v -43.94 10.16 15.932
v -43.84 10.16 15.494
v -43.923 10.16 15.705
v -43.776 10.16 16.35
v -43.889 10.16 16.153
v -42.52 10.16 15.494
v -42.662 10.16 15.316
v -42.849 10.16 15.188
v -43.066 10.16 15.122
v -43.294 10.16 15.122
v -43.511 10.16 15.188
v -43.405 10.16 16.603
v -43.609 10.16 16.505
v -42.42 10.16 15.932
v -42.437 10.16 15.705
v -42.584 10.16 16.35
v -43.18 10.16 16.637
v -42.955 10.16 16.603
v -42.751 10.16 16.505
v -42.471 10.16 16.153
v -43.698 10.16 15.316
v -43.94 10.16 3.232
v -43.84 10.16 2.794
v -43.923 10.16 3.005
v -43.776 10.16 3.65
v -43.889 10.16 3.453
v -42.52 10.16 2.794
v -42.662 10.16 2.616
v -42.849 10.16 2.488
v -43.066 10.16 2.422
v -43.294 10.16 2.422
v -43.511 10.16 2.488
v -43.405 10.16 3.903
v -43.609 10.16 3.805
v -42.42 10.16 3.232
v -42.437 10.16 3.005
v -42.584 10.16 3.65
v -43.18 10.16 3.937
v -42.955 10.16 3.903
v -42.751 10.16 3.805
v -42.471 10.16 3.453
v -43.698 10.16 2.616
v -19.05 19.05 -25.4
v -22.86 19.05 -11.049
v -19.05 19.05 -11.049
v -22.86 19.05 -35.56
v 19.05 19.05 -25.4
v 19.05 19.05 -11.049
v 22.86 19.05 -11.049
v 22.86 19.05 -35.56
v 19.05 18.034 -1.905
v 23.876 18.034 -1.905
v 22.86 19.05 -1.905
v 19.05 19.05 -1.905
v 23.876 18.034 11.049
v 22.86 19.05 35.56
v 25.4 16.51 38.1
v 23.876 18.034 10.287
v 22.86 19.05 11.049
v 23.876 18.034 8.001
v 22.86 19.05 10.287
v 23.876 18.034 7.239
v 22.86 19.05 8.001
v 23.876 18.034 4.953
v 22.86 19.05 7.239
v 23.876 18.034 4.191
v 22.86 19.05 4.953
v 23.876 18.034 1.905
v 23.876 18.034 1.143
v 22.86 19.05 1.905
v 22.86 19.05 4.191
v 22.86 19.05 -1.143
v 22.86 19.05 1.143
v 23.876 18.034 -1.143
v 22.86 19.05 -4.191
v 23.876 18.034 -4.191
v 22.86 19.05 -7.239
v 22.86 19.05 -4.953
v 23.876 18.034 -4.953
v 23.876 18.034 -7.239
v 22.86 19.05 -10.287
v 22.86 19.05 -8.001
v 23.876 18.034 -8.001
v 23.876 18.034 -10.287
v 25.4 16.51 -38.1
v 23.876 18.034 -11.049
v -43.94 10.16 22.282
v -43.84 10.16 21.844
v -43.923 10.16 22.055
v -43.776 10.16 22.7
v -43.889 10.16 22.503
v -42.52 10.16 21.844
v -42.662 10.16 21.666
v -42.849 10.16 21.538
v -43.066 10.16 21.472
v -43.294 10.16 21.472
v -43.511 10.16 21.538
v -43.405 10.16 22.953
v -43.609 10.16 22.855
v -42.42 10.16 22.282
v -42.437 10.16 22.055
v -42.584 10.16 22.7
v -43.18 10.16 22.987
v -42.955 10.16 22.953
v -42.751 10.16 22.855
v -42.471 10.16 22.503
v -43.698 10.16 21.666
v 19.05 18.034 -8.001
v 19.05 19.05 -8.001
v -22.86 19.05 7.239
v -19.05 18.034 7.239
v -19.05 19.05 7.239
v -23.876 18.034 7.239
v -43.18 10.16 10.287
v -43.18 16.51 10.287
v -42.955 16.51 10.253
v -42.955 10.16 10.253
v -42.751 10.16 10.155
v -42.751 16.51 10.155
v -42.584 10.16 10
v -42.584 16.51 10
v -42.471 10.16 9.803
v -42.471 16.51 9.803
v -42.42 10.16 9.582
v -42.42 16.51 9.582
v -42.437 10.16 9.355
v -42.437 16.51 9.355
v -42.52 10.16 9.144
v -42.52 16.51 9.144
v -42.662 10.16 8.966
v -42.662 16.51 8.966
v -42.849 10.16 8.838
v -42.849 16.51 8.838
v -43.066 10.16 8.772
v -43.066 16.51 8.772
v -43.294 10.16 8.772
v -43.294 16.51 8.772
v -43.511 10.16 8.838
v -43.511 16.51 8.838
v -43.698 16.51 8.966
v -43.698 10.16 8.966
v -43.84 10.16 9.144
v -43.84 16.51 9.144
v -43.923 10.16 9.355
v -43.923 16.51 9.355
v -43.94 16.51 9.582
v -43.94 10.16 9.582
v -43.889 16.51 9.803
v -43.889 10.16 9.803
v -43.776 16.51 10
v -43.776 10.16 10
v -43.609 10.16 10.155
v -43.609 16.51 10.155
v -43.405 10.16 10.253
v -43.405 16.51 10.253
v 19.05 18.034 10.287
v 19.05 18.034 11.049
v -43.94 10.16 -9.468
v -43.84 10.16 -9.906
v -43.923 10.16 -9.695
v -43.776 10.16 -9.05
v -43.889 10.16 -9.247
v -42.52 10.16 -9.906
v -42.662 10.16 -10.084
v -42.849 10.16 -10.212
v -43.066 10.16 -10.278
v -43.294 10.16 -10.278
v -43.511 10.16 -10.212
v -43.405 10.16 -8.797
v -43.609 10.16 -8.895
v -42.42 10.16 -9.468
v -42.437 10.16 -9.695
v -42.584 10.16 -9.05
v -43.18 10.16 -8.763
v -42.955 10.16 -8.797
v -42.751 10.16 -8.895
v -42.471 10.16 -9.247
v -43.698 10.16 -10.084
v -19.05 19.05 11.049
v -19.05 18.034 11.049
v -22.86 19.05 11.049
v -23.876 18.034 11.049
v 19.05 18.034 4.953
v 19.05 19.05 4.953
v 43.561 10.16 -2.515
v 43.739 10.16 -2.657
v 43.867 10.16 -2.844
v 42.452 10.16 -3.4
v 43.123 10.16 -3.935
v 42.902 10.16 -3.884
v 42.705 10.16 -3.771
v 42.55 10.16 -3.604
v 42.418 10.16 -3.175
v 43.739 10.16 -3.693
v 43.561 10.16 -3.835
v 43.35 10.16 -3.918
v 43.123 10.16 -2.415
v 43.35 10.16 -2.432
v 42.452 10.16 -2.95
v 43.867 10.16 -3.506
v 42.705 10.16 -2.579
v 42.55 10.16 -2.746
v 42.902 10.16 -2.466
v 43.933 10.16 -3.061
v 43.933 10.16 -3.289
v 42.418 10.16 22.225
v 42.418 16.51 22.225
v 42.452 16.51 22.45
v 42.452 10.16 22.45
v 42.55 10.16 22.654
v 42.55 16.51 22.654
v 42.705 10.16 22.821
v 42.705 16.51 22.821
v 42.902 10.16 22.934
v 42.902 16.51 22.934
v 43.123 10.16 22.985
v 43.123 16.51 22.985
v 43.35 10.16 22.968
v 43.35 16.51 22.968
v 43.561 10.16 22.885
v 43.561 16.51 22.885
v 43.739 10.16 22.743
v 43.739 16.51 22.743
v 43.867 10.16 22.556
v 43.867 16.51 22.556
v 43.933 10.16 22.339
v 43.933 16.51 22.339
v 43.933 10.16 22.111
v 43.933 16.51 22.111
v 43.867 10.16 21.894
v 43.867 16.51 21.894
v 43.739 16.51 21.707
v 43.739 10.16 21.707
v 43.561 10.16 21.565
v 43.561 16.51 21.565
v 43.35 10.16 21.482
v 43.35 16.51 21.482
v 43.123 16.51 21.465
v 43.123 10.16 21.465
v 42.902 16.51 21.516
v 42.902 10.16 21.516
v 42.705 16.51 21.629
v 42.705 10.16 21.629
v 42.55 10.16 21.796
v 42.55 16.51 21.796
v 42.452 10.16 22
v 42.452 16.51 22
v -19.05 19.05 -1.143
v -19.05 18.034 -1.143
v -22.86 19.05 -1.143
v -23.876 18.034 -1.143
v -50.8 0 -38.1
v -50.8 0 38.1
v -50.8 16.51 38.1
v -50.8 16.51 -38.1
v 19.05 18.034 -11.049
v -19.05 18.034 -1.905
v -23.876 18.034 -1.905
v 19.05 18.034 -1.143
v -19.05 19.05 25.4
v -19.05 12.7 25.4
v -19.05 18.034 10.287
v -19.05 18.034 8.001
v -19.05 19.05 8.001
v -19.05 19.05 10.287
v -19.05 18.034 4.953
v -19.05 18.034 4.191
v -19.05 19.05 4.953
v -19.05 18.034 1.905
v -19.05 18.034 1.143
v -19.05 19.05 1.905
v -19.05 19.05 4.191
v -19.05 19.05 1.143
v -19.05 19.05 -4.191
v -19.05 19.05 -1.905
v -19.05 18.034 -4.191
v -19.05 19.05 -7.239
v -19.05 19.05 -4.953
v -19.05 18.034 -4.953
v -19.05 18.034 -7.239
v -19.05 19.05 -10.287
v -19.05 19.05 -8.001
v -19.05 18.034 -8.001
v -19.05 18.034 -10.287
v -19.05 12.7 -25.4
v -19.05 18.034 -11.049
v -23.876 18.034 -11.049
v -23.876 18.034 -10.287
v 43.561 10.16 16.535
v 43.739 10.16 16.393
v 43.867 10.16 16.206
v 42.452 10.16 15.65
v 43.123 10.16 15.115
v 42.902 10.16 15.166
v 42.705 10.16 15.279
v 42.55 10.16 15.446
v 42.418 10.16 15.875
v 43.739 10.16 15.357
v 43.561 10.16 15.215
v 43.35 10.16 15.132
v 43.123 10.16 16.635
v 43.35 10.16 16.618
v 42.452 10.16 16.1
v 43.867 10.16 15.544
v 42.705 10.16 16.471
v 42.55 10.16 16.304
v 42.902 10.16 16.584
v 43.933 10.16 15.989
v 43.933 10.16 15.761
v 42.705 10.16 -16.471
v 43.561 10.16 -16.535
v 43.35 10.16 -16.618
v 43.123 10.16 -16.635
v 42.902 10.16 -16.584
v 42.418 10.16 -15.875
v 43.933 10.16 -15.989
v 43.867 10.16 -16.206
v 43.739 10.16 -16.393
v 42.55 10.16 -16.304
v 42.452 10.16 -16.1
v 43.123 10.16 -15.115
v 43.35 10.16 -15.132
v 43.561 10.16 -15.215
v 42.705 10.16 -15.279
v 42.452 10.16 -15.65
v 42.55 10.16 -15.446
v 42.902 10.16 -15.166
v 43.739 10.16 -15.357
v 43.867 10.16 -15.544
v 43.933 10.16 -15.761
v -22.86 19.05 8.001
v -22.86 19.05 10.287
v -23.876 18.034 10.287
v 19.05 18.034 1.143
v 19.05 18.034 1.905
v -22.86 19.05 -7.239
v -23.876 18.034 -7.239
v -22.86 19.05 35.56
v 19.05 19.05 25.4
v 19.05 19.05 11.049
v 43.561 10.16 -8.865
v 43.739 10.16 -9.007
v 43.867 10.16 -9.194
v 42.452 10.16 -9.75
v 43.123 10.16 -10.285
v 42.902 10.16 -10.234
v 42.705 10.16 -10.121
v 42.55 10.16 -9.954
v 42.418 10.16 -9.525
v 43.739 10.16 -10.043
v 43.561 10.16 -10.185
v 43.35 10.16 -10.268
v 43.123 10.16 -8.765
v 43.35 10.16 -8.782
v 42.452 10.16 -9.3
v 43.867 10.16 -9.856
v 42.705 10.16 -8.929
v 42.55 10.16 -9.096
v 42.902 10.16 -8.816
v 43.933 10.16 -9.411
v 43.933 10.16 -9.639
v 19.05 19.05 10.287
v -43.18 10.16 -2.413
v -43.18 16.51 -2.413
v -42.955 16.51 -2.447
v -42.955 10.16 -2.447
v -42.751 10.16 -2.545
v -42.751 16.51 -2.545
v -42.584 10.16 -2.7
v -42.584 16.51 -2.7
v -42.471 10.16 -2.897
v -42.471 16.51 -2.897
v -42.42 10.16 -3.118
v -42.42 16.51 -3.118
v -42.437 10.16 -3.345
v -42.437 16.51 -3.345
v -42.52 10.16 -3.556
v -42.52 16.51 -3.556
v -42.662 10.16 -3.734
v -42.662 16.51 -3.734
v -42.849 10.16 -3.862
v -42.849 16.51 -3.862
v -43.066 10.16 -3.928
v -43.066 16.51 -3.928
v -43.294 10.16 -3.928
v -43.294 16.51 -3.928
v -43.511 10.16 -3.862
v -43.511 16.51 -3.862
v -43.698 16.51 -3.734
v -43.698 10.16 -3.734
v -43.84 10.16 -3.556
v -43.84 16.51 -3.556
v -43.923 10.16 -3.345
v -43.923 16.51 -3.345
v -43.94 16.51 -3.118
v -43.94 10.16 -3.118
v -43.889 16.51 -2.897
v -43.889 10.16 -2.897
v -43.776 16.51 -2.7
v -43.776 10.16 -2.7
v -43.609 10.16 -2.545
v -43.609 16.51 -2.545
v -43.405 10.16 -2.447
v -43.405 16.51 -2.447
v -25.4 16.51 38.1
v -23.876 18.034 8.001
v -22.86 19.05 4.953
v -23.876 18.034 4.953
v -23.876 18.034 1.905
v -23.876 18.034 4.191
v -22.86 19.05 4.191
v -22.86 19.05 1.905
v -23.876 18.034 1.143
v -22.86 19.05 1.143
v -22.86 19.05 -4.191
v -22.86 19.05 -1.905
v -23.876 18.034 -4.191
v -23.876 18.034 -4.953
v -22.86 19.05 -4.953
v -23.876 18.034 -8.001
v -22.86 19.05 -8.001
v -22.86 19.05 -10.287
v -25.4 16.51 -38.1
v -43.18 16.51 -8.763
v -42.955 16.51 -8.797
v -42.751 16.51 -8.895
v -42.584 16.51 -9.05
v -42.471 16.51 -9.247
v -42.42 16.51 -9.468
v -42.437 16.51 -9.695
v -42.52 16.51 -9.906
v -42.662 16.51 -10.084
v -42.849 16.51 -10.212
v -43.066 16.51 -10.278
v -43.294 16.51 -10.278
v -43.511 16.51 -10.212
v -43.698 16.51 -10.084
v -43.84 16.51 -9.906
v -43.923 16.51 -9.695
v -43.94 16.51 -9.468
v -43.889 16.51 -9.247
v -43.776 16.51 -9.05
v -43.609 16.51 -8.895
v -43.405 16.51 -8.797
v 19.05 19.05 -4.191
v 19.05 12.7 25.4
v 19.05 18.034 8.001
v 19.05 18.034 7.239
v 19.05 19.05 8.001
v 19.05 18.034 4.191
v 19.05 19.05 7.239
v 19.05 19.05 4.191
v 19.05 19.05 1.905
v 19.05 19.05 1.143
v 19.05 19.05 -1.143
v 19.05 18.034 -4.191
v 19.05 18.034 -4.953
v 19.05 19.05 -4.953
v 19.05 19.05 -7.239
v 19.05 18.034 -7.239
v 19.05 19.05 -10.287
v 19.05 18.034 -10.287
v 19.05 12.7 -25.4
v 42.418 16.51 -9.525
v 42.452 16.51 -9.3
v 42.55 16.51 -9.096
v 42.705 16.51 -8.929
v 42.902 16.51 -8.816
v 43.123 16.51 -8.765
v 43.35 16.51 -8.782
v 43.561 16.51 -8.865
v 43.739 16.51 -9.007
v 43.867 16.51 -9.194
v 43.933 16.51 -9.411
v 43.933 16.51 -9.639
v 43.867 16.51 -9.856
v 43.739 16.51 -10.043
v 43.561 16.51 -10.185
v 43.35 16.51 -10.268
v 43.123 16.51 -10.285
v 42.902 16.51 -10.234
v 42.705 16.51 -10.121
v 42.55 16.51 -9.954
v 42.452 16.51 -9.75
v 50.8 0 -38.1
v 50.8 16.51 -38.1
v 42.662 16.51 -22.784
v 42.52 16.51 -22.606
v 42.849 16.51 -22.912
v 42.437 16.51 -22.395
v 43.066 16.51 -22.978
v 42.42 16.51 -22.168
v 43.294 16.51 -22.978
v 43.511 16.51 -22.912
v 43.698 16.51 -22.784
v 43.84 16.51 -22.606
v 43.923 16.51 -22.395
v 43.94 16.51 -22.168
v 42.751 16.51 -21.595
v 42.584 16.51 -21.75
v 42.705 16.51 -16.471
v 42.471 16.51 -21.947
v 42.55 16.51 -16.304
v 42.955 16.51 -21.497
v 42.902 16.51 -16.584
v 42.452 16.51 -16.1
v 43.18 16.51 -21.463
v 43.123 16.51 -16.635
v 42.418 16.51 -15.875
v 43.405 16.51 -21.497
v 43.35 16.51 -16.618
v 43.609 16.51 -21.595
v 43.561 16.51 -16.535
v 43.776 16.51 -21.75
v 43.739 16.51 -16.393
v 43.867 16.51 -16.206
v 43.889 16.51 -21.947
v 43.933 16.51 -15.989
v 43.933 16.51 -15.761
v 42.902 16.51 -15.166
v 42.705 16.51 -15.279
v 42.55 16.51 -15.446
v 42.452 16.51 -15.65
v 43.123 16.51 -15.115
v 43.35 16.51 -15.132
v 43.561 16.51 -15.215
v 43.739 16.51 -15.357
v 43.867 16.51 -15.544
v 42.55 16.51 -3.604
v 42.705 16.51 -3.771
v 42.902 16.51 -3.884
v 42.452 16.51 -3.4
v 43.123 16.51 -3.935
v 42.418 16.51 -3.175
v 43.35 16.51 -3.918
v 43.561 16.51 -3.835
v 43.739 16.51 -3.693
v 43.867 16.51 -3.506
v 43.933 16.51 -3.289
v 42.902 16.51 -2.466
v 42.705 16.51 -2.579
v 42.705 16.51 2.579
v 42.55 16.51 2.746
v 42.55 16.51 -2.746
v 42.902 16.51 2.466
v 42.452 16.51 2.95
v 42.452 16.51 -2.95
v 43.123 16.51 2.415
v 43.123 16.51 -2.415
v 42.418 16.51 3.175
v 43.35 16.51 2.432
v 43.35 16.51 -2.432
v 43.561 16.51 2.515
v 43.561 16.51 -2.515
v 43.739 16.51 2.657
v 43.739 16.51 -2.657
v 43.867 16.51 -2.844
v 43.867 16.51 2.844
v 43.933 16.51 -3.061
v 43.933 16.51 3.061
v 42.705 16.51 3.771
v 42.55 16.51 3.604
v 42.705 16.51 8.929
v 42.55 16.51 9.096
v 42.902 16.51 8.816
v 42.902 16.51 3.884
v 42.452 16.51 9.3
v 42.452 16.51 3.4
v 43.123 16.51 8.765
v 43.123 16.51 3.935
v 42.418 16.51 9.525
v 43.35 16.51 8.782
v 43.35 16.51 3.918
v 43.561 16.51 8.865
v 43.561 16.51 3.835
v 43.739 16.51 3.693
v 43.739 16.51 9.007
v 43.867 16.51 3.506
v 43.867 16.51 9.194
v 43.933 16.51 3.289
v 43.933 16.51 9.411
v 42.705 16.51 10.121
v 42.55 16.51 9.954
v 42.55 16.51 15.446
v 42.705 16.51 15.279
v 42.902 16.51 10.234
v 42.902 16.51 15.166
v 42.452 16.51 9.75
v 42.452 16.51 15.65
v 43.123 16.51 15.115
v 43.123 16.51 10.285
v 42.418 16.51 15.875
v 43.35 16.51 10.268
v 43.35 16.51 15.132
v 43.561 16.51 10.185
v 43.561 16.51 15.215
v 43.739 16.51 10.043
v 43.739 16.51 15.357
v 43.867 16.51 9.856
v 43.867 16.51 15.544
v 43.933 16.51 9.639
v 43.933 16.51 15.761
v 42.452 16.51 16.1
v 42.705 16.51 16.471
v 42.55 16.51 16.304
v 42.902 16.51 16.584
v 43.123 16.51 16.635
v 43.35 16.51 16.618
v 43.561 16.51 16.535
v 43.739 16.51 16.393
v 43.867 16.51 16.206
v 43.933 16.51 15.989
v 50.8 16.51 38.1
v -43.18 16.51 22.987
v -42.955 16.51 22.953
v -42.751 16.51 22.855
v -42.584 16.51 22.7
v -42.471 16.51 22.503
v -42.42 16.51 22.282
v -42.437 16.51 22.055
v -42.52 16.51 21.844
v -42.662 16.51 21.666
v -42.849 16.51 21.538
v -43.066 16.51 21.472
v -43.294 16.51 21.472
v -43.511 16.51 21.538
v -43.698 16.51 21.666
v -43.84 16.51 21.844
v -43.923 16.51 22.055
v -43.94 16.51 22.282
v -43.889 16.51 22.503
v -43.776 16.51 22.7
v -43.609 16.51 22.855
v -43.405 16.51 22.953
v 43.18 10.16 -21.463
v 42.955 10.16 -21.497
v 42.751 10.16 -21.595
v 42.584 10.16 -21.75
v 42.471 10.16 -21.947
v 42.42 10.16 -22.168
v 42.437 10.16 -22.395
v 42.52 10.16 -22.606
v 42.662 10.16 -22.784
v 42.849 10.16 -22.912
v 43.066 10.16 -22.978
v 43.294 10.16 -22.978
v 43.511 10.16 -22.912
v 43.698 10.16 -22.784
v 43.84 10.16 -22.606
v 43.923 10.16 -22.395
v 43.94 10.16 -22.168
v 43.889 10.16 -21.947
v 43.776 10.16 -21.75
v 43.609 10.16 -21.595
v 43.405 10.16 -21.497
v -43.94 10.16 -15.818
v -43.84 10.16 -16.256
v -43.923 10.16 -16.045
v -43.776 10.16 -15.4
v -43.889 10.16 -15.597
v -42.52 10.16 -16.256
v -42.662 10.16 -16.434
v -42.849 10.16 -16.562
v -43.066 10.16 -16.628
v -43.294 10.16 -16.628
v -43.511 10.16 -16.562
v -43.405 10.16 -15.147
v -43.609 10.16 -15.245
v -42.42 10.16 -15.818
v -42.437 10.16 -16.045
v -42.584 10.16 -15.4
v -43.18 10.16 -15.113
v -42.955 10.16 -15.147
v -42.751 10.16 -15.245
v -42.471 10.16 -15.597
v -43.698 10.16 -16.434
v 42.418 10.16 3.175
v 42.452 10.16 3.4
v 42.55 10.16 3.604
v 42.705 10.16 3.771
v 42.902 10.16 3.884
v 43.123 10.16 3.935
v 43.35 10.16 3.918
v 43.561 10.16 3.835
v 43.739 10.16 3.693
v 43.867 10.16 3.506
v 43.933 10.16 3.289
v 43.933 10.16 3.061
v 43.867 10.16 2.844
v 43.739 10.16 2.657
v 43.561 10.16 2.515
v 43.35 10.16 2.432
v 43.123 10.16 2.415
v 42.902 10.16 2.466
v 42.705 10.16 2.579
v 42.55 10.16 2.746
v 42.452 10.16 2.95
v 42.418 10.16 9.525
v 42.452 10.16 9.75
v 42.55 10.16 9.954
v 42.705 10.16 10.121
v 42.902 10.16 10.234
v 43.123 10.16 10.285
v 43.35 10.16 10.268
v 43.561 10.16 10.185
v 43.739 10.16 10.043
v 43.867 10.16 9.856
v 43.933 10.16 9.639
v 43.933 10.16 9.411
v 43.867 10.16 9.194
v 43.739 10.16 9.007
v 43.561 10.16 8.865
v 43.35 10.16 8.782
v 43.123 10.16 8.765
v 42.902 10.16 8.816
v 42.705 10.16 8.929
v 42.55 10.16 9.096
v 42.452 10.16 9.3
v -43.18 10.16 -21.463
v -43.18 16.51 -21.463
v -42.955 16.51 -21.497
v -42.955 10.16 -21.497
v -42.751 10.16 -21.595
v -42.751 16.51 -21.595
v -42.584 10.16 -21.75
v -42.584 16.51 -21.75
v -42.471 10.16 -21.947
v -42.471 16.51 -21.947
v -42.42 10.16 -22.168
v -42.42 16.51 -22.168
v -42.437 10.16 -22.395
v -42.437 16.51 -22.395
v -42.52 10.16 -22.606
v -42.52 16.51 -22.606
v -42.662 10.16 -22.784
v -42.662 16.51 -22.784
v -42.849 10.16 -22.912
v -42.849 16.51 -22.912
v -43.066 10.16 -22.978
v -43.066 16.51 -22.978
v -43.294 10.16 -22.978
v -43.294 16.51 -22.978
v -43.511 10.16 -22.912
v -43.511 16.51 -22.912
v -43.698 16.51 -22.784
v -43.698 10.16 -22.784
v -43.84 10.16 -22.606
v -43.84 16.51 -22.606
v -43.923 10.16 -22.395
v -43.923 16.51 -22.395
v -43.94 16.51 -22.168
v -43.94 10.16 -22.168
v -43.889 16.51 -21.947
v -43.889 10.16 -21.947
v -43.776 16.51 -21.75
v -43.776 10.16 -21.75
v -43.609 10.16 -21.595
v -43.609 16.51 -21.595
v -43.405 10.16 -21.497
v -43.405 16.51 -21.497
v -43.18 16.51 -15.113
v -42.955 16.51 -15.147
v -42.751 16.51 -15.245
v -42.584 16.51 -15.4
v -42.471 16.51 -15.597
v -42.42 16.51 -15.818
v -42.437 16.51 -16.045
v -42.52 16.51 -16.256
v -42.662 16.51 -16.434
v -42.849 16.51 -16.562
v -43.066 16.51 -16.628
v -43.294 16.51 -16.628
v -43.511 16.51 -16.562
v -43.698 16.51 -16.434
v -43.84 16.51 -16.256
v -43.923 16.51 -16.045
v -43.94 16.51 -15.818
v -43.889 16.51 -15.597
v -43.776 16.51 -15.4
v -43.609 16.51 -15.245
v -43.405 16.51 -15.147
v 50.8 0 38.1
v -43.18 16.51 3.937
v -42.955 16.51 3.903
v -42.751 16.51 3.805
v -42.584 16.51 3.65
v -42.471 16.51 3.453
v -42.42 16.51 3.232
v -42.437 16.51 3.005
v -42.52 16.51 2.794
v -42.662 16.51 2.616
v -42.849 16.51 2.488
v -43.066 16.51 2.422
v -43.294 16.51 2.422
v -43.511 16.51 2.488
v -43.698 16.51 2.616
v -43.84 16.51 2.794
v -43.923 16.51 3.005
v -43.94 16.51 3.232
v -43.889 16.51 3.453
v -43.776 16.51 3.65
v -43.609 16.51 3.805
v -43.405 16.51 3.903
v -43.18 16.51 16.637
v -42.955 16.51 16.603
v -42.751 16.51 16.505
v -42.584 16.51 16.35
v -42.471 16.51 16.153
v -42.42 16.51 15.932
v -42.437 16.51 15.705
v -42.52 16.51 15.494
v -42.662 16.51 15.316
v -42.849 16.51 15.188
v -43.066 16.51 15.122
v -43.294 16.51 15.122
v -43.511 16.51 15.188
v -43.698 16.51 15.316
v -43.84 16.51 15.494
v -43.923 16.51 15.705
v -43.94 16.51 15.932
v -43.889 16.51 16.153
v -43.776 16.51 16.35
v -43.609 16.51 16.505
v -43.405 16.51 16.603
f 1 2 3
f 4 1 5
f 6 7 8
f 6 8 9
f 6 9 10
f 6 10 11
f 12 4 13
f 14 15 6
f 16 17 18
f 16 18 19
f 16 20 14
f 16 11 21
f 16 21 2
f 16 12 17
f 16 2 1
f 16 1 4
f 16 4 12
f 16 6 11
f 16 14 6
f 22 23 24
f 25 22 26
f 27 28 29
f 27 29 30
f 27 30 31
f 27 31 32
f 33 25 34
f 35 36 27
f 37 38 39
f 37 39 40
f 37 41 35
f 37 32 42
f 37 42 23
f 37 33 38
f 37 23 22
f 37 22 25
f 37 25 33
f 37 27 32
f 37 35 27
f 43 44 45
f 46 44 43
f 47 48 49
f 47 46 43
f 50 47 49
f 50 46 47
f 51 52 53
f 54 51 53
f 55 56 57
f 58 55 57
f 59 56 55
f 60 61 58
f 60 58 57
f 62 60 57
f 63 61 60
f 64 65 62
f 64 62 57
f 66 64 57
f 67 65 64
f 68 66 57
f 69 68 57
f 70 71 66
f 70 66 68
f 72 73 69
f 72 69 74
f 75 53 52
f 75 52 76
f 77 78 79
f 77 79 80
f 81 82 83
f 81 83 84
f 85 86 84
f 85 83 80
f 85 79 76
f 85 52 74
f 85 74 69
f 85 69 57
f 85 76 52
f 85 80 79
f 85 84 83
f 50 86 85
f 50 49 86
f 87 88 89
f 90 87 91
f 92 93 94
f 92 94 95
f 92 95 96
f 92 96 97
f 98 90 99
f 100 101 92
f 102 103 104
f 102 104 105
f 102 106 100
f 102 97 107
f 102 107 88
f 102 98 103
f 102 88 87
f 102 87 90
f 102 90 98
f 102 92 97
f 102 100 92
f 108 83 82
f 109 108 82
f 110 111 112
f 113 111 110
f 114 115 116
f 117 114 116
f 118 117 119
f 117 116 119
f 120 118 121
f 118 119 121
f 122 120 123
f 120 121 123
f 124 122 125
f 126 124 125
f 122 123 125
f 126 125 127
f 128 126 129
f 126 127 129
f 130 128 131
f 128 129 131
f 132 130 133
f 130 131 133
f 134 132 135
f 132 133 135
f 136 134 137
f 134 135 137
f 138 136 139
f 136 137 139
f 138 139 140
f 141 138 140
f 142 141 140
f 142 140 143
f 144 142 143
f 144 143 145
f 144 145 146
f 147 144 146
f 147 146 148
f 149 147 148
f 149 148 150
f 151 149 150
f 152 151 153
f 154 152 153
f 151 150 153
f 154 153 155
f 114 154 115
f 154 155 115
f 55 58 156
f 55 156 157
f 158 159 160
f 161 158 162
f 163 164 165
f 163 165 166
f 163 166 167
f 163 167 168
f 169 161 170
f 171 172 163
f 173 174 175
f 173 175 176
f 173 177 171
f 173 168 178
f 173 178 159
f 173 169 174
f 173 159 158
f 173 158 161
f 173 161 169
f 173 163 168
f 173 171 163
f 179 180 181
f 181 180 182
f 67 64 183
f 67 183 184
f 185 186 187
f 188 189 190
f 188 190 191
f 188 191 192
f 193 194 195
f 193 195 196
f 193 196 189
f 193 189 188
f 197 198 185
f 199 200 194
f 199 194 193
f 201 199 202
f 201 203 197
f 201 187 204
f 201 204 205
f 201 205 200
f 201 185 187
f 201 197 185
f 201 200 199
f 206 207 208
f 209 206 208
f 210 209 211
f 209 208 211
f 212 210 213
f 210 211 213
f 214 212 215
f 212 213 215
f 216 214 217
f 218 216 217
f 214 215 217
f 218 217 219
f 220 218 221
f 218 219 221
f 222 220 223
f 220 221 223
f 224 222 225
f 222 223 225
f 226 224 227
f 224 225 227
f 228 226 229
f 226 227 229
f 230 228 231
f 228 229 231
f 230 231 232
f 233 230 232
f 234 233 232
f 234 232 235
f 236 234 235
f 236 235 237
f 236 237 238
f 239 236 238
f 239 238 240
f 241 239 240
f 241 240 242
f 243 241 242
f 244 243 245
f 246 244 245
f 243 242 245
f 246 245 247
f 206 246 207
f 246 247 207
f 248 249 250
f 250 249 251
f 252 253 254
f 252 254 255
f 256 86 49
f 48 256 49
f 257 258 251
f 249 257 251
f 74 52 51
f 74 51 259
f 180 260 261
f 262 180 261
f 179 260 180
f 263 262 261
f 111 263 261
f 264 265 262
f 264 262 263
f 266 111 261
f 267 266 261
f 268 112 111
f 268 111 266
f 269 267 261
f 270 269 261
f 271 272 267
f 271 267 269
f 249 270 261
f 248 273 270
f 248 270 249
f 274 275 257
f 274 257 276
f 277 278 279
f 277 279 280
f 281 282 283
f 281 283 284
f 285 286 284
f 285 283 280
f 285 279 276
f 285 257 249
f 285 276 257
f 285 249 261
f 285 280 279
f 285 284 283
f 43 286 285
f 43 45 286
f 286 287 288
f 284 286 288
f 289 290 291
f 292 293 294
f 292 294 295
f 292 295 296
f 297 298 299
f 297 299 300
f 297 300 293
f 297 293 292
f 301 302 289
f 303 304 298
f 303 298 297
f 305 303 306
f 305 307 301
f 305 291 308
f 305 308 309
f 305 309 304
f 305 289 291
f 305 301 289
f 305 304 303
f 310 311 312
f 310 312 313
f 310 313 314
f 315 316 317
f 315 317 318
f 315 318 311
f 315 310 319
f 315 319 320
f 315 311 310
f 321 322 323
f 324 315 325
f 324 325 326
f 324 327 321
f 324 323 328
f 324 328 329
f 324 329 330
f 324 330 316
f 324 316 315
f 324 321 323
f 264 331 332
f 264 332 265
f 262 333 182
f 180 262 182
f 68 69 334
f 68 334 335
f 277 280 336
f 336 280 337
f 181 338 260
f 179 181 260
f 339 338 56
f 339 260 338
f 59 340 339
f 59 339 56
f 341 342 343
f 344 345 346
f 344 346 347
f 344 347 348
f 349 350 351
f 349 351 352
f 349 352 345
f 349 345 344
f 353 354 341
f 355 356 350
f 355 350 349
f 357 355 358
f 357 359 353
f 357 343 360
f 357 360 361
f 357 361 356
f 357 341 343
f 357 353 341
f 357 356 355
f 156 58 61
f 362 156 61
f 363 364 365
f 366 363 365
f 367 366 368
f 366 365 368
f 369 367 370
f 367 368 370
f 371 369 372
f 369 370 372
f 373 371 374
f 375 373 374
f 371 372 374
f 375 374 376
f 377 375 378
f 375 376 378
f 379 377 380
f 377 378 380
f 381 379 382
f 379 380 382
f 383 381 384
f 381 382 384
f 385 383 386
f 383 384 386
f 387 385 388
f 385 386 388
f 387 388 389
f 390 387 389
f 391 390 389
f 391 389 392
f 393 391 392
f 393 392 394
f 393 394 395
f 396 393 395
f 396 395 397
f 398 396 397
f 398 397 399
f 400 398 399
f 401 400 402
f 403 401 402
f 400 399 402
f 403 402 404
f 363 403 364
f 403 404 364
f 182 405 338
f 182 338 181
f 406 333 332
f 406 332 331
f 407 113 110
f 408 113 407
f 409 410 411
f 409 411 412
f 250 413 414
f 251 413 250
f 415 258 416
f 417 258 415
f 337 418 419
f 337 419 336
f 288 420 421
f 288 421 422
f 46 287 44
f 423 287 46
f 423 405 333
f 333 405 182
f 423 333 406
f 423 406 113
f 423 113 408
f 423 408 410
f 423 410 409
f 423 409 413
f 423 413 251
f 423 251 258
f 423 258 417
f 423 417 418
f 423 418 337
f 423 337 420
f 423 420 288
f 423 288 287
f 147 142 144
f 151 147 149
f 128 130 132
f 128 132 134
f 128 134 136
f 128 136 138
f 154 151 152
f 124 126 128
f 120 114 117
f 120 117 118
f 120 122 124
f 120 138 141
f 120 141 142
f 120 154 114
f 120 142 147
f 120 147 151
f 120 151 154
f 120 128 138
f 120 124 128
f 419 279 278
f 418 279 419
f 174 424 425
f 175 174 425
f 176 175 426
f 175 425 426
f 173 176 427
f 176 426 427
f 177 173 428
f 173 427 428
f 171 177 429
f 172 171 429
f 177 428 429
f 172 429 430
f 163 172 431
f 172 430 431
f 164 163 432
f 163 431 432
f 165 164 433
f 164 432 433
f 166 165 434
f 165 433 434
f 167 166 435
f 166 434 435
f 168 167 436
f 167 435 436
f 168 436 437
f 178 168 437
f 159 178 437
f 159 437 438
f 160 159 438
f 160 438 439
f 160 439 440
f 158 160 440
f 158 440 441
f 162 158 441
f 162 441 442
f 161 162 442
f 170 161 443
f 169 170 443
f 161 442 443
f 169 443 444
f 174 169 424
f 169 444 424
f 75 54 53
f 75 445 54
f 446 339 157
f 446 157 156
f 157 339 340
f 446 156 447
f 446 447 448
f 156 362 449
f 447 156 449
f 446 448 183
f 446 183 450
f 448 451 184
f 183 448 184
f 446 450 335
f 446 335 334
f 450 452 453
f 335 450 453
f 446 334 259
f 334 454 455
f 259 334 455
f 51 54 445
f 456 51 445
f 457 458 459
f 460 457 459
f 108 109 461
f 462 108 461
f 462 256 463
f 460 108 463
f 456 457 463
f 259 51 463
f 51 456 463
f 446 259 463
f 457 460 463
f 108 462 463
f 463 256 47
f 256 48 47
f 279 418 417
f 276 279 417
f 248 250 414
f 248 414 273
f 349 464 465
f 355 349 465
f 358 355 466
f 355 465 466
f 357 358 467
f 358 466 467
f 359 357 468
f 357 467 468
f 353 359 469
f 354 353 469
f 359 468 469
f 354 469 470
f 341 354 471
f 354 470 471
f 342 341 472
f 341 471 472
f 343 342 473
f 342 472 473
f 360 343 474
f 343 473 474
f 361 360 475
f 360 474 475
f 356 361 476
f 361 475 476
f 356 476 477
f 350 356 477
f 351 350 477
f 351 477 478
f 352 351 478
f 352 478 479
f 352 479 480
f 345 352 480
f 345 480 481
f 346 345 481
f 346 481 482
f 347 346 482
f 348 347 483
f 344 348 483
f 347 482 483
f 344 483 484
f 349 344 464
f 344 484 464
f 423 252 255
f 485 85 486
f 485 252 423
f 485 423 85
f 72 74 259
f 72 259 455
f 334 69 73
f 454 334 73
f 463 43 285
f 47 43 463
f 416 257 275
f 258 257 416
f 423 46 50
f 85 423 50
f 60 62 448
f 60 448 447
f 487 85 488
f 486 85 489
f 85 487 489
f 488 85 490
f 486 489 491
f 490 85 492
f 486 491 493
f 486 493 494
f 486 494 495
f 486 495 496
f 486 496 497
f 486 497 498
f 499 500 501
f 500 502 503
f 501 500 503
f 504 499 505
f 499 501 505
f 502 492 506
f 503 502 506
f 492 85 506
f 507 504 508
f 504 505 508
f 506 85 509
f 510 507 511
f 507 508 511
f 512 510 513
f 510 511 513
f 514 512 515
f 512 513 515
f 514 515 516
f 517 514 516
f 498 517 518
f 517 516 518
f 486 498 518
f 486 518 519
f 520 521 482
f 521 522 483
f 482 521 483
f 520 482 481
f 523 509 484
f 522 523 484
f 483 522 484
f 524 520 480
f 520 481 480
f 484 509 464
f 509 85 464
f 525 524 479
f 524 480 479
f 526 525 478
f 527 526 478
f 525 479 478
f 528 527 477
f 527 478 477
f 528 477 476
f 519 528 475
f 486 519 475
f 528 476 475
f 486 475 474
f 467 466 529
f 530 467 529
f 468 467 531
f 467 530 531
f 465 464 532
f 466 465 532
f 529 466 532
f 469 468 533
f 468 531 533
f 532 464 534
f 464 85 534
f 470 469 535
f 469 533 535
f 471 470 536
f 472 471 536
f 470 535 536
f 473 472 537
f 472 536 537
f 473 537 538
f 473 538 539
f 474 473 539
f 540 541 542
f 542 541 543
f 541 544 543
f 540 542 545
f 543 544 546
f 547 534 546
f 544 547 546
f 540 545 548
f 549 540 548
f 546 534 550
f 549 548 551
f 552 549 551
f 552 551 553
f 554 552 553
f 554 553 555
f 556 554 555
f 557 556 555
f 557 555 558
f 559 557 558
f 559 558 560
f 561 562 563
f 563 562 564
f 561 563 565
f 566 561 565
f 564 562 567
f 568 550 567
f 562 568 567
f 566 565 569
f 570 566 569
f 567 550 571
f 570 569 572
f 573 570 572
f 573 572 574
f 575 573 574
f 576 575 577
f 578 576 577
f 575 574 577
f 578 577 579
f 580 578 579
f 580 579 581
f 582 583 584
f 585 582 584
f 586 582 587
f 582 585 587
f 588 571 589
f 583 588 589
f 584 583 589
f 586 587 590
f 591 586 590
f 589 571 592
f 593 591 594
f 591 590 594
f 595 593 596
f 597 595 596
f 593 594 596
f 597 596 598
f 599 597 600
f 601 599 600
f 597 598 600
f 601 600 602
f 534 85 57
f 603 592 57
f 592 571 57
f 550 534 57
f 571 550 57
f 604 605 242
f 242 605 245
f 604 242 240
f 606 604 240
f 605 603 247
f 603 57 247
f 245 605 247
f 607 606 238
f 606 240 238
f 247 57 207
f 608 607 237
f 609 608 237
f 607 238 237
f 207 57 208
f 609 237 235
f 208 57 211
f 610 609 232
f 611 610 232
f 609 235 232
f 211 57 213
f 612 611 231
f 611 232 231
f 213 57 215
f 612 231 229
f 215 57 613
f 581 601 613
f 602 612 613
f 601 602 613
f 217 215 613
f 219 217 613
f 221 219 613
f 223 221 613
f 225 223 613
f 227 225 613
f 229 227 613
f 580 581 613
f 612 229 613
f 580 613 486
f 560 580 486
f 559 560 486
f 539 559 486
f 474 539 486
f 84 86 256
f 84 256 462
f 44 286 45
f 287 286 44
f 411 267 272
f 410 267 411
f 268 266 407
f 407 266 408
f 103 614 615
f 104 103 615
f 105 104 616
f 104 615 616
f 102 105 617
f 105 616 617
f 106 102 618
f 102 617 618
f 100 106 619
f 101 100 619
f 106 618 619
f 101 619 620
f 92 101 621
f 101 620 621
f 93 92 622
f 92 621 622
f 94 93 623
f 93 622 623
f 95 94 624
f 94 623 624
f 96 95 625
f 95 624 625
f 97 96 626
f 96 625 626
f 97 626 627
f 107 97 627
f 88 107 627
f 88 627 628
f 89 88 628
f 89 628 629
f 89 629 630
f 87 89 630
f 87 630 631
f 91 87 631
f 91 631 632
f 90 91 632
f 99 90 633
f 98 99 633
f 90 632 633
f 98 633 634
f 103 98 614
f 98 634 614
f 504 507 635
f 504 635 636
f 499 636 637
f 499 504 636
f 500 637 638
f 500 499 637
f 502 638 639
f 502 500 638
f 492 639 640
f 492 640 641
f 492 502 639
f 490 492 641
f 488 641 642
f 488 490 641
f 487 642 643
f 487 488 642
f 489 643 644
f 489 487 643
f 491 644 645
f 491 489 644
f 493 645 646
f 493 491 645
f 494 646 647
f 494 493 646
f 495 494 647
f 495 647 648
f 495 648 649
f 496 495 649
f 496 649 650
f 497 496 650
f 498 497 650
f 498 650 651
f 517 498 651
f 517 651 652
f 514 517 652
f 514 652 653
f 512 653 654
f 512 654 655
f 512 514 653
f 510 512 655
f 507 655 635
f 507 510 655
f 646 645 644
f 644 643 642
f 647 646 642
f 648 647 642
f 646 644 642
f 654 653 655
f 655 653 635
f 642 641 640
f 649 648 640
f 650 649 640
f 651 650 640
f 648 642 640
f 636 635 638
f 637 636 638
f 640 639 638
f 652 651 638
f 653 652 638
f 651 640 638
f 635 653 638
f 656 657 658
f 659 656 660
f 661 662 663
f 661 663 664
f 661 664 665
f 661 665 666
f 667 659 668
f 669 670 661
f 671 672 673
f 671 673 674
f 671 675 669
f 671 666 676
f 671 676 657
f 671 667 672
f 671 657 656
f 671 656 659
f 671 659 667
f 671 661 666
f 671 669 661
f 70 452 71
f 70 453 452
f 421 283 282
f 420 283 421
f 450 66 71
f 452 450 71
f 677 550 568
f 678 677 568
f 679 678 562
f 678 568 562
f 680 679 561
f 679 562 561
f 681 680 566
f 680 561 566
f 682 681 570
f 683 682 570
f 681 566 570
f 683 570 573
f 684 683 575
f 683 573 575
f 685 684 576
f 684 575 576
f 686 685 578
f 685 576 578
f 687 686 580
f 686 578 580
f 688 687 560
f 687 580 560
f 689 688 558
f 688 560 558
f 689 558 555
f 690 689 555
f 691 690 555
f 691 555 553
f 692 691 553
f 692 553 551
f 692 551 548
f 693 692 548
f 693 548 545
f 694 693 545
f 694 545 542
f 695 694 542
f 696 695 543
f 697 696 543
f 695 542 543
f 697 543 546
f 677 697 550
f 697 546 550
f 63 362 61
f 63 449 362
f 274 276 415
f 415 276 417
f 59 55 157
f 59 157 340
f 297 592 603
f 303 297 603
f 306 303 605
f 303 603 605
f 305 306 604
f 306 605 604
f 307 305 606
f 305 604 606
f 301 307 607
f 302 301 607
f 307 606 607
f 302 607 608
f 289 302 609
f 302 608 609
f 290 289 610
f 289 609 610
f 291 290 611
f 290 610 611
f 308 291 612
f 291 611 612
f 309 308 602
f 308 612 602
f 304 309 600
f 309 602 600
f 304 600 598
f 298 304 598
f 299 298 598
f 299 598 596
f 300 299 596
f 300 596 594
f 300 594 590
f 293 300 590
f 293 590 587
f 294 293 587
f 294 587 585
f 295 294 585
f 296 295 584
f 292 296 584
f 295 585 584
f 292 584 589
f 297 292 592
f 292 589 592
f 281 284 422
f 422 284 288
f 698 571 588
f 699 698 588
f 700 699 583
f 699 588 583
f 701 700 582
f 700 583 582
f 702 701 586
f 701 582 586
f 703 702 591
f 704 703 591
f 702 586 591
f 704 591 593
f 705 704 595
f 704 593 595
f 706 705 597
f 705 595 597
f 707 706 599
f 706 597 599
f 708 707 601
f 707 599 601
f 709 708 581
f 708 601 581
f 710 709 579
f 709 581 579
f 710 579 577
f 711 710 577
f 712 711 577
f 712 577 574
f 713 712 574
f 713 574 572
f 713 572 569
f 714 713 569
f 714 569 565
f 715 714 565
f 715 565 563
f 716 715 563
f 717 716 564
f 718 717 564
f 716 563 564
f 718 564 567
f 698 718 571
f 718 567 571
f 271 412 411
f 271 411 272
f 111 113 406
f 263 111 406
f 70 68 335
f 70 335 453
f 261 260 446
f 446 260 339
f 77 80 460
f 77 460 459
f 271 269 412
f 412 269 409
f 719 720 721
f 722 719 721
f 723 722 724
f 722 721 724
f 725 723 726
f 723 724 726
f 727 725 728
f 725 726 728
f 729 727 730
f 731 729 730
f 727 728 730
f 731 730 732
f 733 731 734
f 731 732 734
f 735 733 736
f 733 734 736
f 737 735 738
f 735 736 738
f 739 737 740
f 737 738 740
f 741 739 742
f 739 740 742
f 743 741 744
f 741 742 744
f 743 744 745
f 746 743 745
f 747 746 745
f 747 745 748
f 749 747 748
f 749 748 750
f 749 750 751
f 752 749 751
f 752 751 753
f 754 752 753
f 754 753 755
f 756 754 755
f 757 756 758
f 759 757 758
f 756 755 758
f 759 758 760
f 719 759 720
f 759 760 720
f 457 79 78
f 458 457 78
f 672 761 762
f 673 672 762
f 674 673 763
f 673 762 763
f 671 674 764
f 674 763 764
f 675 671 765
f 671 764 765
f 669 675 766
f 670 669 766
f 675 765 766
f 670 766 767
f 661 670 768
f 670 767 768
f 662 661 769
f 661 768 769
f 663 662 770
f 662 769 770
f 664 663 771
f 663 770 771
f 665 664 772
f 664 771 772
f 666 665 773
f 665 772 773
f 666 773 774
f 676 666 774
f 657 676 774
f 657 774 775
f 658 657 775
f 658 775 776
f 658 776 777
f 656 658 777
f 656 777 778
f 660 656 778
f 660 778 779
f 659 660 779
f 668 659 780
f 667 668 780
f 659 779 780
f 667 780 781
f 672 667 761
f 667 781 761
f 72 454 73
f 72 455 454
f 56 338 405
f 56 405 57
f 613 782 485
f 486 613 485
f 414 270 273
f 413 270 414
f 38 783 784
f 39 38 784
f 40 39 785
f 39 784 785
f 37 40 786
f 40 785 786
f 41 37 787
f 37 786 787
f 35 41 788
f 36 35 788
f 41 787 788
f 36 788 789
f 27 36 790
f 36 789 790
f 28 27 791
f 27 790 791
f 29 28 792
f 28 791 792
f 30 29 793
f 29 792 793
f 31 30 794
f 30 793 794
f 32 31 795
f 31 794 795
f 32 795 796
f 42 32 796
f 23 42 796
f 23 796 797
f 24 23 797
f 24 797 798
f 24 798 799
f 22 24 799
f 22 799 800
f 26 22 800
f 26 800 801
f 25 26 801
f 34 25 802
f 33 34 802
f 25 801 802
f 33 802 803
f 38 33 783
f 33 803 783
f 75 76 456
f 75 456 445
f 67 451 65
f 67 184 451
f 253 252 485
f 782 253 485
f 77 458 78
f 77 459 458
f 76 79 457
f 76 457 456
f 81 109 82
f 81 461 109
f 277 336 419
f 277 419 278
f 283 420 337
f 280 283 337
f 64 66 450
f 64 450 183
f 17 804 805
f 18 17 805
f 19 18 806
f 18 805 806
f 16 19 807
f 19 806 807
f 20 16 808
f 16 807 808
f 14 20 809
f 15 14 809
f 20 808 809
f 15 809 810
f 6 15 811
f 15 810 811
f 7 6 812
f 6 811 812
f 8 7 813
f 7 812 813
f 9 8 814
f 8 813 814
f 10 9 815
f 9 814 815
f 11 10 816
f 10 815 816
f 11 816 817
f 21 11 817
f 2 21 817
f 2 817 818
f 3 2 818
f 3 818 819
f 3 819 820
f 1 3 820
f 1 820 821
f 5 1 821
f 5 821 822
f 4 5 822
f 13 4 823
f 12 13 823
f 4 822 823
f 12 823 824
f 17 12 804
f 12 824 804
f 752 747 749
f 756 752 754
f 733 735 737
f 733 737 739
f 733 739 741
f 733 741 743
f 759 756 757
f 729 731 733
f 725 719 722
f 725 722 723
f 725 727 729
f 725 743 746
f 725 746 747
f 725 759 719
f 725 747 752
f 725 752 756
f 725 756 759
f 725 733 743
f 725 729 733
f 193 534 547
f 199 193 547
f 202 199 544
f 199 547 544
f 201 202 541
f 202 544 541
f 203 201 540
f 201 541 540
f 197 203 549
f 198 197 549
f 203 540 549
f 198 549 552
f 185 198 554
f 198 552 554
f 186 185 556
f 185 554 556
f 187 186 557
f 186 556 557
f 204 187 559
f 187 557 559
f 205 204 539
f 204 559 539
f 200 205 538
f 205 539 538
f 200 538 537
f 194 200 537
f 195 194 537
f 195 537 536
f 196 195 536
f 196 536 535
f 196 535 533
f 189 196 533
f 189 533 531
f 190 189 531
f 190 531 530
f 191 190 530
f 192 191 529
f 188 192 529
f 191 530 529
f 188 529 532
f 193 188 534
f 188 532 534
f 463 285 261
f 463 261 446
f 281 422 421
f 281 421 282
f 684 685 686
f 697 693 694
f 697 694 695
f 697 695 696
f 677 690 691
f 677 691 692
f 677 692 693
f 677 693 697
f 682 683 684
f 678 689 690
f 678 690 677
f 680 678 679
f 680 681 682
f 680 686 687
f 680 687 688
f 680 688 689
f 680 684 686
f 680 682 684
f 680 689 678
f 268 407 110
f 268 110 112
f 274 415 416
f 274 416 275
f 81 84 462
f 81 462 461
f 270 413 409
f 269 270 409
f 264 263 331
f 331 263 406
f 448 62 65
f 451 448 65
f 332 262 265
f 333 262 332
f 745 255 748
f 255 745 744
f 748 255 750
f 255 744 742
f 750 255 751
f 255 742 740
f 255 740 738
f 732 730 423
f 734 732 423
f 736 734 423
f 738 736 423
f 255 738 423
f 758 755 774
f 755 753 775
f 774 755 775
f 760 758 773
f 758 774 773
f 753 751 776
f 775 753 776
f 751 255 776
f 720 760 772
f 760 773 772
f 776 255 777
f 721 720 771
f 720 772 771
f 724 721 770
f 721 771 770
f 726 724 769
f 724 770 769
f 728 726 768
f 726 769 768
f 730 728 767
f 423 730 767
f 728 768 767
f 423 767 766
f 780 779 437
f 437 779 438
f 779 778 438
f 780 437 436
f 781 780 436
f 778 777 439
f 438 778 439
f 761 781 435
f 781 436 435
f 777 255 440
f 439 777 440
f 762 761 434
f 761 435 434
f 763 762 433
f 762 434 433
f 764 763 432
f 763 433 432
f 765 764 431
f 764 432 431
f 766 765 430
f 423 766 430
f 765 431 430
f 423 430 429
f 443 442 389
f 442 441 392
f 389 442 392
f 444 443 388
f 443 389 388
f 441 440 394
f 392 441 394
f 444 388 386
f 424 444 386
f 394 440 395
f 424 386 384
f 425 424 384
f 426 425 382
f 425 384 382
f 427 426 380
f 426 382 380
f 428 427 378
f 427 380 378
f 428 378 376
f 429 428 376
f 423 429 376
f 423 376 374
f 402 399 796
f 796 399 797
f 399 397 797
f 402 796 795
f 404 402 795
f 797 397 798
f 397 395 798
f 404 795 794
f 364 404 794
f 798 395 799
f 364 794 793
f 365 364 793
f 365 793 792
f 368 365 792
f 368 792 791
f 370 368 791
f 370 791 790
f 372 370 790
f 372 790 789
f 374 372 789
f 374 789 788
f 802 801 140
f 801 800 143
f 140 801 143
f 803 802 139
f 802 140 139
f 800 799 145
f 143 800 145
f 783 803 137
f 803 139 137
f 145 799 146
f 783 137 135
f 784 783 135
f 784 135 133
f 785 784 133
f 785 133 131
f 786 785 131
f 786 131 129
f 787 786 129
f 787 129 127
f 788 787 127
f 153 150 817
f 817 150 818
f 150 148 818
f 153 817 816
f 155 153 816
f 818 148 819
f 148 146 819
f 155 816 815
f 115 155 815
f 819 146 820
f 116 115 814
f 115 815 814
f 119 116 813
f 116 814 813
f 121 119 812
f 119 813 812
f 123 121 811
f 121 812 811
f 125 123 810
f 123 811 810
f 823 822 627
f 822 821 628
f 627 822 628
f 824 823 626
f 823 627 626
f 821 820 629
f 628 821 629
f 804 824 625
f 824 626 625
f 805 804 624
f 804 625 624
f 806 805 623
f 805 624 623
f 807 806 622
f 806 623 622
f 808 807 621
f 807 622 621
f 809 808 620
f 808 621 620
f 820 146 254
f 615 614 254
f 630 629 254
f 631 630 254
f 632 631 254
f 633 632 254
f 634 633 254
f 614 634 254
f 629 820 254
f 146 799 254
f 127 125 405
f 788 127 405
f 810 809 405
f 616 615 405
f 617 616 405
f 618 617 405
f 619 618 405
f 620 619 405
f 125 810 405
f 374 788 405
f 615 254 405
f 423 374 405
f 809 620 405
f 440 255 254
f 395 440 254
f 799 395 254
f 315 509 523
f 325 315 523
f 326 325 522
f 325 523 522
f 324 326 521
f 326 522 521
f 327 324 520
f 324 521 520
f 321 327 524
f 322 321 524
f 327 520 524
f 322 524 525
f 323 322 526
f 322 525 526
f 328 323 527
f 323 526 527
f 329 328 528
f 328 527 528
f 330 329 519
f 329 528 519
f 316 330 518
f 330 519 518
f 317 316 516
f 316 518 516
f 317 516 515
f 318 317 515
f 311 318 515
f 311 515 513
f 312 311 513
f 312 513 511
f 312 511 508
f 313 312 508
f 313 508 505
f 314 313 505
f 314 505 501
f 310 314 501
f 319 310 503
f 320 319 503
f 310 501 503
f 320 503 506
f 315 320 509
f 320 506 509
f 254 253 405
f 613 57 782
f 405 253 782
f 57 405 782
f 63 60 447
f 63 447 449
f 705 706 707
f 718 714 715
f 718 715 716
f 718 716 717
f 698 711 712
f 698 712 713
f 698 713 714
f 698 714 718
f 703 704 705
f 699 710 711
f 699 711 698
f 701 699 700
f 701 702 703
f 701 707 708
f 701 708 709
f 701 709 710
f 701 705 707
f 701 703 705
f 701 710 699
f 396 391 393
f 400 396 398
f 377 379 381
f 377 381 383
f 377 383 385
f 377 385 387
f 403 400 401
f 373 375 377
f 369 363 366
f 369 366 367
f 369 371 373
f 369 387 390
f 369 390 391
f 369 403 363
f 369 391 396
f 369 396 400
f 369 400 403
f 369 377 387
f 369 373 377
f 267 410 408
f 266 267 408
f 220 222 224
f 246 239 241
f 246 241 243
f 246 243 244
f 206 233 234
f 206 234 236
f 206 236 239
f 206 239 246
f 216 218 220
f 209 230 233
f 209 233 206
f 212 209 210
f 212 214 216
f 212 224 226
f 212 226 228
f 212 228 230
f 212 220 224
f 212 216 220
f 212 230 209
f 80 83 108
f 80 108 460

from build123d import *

# Parameters (mm, degrees)
SKETCH1_W               = 101.6
SKETCH1_H               = 76.2
BOSS_EXTRUDE1_DEPTH     = 19.05
SKETCH2_W               = 38.1
SKETCH2_H               = 50.8
CUT_EXTRUDE1_DEPTH      = 6.35
SKETCH3_W               = 25.4
SKETCH3_H               = 2.54
CUT_EXTRUDE2_DEPTH      = 94.541341128
CHAMFER1_SIZE           = 2.54
SKETCH4_R               = 0.762
CUT_EXTRUDE3_DEPTH      = 6.35
LPATTERN1_COUNT         = 8
LPATTERN1_PITCH         = 6.35
MIRROR1_COPY_1_SKETCH_R = 0.762
MIRROR1_COPY_1_DEPTH    = 6.35
MIRROR1_COPY_2_SKETCH_R = 0.762
MIRROR1_COPY_2_DEPTH    = 6.35
MIRROR1_COPY_3_SKETCH_R = 0.762
MIRROR1_COPY_3_DEPTH    = 6.35
MIRROR1_COPY_4_SKETCH_R = 0.762
MIRROR1_COPY_4_DEPTH    = 6.35
MIRROR1_COPY_5_SKETCH_R = 0.762
MIRROR1_COPY_5_DEPTH    = 6.35
MIRROR1_COPY_6_SKETCH_R = 0.762
MIRROR1_COPY_6_DEPTH    = 6.35
MIRROR1_COPY_7_SKETCH_R = 0.762
MIRROR1_COPY_7_DEPTH    = 6.35
SKETCH6_W               = 0.762
SKETCH6_H               = 1.016
CUT_EXTRUDE8_DEPTH      = 111.168382488
LPATTERN2_COUNT         = 8
LPATTERN2_PITCH         = 3.048


with BuildPart() as part:
    # Sketch1 → Boss-Extrude1 (new body)
    with BuildSketch(Plane(origin=(0, 0, 0), x_dir=(1, 0, 0), z_dir=(0, 1, 0))):
        Rectangle(SKETCH1_W, SKETCH1_H)
    extrude(amount=BOSS_EXTRUDE1_DEPTH)

    # Sketch2 → Cut-Extrude1 (cut)
    with BuildSketch(Plane(origin=(0, 19.05, 0), x_dir=(1, 0, 0), z_dir=(0, 1, 0))):
        Rectangle(SKETCH2_W, SKETCH2_H)
    extrude(amount=-CUT_EXTRUDE1_DEPTH, mode=Mode.SUBTRACT)

    # Sketch3 → Cut-Extrude2 (cut, through all)
    with BuildSketch(Plane.XY.offset(38.1)):
        with Locations((-38.1, 17.78)):
            Rectangle(SKETCH3_W, SKETCH3_H)
        with Locations((38.1, 17.78)):
            Rectangle(SKETCH3_W, SKETCH3_H)
    extrude(amount=-CUT_EXTRUDE2_DEPTH, mode=Mode.SUBTRACT)

    # Chamfer1
    chamfer1_edges = [part.edges().sort_by_distance(p)[0] for p in [
        (25.4, 19.05, 0),
        (-25.4, 19.05, 0),
        (0, 19.05, -38.1),
        (0, 19.05, 38.1),
    ]]
    chamfer(chamfer1_edges, length=CHAMFER1_SIZE - 0.0001)  # a hair under: the kernel refuses the full size

    # Sketch4 → Cut-Extrude3 (cut)
    with BuildSketch(Plane(origin=(0, 16.51, 0), x_dir=(1, 0, 0), z_dir=(0, 1, 0))):
        with Locations(Location((-43.18, 22.225, 0), (0, 0, 270))):
            Circle(SKETCH4_R)
    cut_extrude3 = extrude(amount=-CUT_EXTRUDE3_DEPTH, mode=Mode.SUBTRACT)

    # LPattern1: Cut-Extrude3 ×8
    with Locations(*[(0, 0, i * LPATTERN1_PITCH) for i in range(1, LPATTERN1_COUNT)]):
        add(cut_extrude3, mode=Mode.SUBTRACT)

    # Mirror1: Cut-Extrude3 across plane
    add(cut_extrude3.mirror(Plane(origin=(0, 0, 0), x_dir=(0, 0, 1), z_dir=(1, 0, 0))), mode=Mode.SUBTRACT)

    # Mirror1 copy 1 sketch → Mirror1 copy 1 (cut)
    with BuildSketch(Plane(origin=(0, 16.51, 6.35), x_dir=(-1, 0, 0), z_dir=(0, 1, 0))):
        with Locations((-43.18, -22.225)):
            Circle(MIRROR1_COPY_1_SKETCH_R)
    extrude(amount=-MIRROR1_COPY_1_DEPTH, mode=Mode.SUBTRACT)

    # Mirror1 copy 2 sketch → Mirror1 copy 2 (cut)
    with BuildSketch(Plane(origin=(0, 16.51, 12.7), x_dir=(-1, 0, 0), z_dir=(0, 1, 0))):
        with Locations((-43.18, -22.225)):
            Circle(MIRROR1_COPY_2_SKETCH_R)
    extrude(amount=-MIRROR1_COPY_2_DEPTH, mode=Mode.SUBTRACT)

    # Mirror1 copy 3 sketch → Mirror1 copy 3 (cut)
    with BuildSketch(Plane(origin=(0, 16.51, 19.05), x_dir=(-1, 0, 0), z_dir=(0, 1, 0))):
        with Locations((-43.18, -22.225)):
            Circle(MIRROR1_COPY_3_SKETCH_R)
    extrude(amount=-MIRROR1_COPY_3_DEPTH, mode=Mode.SUBTRACT)

    # Mirror1 copy 4 sketch → Mirror1 copy 4 (cut)
    with BuildSketch(Plane(origin=(0, 16.51, 25.4), x_dir=(-1, 0, 0), z_dir=(0, 1, 0))):
        with Locations((-43.18, -22.225)):
            Circle(MIRROR1_COPY_4_SKETCH_R)
    extrude(amount=-MIRROR1_COPY_4_DEPTH, mode=Mode.SUBTRACT)

    # Mirror1 copy 5 sketch → Mirror1 copy 5 (cut)
    with BuildSketch(Plane(origin=(0, 16.51, 31.75), x_dir=(-1, 0, 0), z_dir=(0, 1, 0))):
        with Locations((-43.18, -22.225)):
            Circle(MIRROR1_COPY_5_SKETCH_R)
    extrude(amount=-MIRROR1_COPY_5_DEPTH, mode=Mode.SUBTRACT)

    # Mirror1 copy 6 sketch → Mirror1 copy 6 (cut)
    with BuildSketch(Plane(origin=(0, 16.51, 38.1), x_dir=(-1, 0, 0), z_dir=(0, 1, 0))):
        with Locations((-43.18, -22.225)):
            Circle(MIRROR1_COPY_6_SKETCH_R)
    extrude(amount=-MIRROR1_COPY_6_DEPTH, mode=Mode.SUBTRACT)

    # Mirror1 copy 7 sketch → Mirror1 copy 7 (cut)
    with BuildSketch(Plane(origin=(0, 16.51, 44.45), x_dir=(-1, 0, 0), z_dir=(0, 1, 0))):
        with Locations((-43.18, -22.225)):
            Circle(MIRROR1_COPY_7_SKETCH_R)
    extrude(amount=-MIRROR1_COPY_7_DEPTH, mode=Mode.SUBTRACT)

    # Sketch6 → Cut-Extrude8 (cut, through all)
    with BuildSketch(Plane.ZY.offset(50.8)):
        with Locations((-10.668, 18.542)):
            Rectangle(SKETCH6_W, SKETCH6_H)
    cut_extrude8 = extrude(amount=-CUT_EXTRUDE8_DEPTH, mode=Mode.SUBTRACT)

    # LPattern2: Cut-Extrude8 ×8
    with Locations(*[(0, 0, i * LPATTERN2_PITCH) for i in range(1, LPATTERN2_COUNT)]):
        add(cut_extrude8, mode=Mode.SUBTRACT)


solid = part.part
